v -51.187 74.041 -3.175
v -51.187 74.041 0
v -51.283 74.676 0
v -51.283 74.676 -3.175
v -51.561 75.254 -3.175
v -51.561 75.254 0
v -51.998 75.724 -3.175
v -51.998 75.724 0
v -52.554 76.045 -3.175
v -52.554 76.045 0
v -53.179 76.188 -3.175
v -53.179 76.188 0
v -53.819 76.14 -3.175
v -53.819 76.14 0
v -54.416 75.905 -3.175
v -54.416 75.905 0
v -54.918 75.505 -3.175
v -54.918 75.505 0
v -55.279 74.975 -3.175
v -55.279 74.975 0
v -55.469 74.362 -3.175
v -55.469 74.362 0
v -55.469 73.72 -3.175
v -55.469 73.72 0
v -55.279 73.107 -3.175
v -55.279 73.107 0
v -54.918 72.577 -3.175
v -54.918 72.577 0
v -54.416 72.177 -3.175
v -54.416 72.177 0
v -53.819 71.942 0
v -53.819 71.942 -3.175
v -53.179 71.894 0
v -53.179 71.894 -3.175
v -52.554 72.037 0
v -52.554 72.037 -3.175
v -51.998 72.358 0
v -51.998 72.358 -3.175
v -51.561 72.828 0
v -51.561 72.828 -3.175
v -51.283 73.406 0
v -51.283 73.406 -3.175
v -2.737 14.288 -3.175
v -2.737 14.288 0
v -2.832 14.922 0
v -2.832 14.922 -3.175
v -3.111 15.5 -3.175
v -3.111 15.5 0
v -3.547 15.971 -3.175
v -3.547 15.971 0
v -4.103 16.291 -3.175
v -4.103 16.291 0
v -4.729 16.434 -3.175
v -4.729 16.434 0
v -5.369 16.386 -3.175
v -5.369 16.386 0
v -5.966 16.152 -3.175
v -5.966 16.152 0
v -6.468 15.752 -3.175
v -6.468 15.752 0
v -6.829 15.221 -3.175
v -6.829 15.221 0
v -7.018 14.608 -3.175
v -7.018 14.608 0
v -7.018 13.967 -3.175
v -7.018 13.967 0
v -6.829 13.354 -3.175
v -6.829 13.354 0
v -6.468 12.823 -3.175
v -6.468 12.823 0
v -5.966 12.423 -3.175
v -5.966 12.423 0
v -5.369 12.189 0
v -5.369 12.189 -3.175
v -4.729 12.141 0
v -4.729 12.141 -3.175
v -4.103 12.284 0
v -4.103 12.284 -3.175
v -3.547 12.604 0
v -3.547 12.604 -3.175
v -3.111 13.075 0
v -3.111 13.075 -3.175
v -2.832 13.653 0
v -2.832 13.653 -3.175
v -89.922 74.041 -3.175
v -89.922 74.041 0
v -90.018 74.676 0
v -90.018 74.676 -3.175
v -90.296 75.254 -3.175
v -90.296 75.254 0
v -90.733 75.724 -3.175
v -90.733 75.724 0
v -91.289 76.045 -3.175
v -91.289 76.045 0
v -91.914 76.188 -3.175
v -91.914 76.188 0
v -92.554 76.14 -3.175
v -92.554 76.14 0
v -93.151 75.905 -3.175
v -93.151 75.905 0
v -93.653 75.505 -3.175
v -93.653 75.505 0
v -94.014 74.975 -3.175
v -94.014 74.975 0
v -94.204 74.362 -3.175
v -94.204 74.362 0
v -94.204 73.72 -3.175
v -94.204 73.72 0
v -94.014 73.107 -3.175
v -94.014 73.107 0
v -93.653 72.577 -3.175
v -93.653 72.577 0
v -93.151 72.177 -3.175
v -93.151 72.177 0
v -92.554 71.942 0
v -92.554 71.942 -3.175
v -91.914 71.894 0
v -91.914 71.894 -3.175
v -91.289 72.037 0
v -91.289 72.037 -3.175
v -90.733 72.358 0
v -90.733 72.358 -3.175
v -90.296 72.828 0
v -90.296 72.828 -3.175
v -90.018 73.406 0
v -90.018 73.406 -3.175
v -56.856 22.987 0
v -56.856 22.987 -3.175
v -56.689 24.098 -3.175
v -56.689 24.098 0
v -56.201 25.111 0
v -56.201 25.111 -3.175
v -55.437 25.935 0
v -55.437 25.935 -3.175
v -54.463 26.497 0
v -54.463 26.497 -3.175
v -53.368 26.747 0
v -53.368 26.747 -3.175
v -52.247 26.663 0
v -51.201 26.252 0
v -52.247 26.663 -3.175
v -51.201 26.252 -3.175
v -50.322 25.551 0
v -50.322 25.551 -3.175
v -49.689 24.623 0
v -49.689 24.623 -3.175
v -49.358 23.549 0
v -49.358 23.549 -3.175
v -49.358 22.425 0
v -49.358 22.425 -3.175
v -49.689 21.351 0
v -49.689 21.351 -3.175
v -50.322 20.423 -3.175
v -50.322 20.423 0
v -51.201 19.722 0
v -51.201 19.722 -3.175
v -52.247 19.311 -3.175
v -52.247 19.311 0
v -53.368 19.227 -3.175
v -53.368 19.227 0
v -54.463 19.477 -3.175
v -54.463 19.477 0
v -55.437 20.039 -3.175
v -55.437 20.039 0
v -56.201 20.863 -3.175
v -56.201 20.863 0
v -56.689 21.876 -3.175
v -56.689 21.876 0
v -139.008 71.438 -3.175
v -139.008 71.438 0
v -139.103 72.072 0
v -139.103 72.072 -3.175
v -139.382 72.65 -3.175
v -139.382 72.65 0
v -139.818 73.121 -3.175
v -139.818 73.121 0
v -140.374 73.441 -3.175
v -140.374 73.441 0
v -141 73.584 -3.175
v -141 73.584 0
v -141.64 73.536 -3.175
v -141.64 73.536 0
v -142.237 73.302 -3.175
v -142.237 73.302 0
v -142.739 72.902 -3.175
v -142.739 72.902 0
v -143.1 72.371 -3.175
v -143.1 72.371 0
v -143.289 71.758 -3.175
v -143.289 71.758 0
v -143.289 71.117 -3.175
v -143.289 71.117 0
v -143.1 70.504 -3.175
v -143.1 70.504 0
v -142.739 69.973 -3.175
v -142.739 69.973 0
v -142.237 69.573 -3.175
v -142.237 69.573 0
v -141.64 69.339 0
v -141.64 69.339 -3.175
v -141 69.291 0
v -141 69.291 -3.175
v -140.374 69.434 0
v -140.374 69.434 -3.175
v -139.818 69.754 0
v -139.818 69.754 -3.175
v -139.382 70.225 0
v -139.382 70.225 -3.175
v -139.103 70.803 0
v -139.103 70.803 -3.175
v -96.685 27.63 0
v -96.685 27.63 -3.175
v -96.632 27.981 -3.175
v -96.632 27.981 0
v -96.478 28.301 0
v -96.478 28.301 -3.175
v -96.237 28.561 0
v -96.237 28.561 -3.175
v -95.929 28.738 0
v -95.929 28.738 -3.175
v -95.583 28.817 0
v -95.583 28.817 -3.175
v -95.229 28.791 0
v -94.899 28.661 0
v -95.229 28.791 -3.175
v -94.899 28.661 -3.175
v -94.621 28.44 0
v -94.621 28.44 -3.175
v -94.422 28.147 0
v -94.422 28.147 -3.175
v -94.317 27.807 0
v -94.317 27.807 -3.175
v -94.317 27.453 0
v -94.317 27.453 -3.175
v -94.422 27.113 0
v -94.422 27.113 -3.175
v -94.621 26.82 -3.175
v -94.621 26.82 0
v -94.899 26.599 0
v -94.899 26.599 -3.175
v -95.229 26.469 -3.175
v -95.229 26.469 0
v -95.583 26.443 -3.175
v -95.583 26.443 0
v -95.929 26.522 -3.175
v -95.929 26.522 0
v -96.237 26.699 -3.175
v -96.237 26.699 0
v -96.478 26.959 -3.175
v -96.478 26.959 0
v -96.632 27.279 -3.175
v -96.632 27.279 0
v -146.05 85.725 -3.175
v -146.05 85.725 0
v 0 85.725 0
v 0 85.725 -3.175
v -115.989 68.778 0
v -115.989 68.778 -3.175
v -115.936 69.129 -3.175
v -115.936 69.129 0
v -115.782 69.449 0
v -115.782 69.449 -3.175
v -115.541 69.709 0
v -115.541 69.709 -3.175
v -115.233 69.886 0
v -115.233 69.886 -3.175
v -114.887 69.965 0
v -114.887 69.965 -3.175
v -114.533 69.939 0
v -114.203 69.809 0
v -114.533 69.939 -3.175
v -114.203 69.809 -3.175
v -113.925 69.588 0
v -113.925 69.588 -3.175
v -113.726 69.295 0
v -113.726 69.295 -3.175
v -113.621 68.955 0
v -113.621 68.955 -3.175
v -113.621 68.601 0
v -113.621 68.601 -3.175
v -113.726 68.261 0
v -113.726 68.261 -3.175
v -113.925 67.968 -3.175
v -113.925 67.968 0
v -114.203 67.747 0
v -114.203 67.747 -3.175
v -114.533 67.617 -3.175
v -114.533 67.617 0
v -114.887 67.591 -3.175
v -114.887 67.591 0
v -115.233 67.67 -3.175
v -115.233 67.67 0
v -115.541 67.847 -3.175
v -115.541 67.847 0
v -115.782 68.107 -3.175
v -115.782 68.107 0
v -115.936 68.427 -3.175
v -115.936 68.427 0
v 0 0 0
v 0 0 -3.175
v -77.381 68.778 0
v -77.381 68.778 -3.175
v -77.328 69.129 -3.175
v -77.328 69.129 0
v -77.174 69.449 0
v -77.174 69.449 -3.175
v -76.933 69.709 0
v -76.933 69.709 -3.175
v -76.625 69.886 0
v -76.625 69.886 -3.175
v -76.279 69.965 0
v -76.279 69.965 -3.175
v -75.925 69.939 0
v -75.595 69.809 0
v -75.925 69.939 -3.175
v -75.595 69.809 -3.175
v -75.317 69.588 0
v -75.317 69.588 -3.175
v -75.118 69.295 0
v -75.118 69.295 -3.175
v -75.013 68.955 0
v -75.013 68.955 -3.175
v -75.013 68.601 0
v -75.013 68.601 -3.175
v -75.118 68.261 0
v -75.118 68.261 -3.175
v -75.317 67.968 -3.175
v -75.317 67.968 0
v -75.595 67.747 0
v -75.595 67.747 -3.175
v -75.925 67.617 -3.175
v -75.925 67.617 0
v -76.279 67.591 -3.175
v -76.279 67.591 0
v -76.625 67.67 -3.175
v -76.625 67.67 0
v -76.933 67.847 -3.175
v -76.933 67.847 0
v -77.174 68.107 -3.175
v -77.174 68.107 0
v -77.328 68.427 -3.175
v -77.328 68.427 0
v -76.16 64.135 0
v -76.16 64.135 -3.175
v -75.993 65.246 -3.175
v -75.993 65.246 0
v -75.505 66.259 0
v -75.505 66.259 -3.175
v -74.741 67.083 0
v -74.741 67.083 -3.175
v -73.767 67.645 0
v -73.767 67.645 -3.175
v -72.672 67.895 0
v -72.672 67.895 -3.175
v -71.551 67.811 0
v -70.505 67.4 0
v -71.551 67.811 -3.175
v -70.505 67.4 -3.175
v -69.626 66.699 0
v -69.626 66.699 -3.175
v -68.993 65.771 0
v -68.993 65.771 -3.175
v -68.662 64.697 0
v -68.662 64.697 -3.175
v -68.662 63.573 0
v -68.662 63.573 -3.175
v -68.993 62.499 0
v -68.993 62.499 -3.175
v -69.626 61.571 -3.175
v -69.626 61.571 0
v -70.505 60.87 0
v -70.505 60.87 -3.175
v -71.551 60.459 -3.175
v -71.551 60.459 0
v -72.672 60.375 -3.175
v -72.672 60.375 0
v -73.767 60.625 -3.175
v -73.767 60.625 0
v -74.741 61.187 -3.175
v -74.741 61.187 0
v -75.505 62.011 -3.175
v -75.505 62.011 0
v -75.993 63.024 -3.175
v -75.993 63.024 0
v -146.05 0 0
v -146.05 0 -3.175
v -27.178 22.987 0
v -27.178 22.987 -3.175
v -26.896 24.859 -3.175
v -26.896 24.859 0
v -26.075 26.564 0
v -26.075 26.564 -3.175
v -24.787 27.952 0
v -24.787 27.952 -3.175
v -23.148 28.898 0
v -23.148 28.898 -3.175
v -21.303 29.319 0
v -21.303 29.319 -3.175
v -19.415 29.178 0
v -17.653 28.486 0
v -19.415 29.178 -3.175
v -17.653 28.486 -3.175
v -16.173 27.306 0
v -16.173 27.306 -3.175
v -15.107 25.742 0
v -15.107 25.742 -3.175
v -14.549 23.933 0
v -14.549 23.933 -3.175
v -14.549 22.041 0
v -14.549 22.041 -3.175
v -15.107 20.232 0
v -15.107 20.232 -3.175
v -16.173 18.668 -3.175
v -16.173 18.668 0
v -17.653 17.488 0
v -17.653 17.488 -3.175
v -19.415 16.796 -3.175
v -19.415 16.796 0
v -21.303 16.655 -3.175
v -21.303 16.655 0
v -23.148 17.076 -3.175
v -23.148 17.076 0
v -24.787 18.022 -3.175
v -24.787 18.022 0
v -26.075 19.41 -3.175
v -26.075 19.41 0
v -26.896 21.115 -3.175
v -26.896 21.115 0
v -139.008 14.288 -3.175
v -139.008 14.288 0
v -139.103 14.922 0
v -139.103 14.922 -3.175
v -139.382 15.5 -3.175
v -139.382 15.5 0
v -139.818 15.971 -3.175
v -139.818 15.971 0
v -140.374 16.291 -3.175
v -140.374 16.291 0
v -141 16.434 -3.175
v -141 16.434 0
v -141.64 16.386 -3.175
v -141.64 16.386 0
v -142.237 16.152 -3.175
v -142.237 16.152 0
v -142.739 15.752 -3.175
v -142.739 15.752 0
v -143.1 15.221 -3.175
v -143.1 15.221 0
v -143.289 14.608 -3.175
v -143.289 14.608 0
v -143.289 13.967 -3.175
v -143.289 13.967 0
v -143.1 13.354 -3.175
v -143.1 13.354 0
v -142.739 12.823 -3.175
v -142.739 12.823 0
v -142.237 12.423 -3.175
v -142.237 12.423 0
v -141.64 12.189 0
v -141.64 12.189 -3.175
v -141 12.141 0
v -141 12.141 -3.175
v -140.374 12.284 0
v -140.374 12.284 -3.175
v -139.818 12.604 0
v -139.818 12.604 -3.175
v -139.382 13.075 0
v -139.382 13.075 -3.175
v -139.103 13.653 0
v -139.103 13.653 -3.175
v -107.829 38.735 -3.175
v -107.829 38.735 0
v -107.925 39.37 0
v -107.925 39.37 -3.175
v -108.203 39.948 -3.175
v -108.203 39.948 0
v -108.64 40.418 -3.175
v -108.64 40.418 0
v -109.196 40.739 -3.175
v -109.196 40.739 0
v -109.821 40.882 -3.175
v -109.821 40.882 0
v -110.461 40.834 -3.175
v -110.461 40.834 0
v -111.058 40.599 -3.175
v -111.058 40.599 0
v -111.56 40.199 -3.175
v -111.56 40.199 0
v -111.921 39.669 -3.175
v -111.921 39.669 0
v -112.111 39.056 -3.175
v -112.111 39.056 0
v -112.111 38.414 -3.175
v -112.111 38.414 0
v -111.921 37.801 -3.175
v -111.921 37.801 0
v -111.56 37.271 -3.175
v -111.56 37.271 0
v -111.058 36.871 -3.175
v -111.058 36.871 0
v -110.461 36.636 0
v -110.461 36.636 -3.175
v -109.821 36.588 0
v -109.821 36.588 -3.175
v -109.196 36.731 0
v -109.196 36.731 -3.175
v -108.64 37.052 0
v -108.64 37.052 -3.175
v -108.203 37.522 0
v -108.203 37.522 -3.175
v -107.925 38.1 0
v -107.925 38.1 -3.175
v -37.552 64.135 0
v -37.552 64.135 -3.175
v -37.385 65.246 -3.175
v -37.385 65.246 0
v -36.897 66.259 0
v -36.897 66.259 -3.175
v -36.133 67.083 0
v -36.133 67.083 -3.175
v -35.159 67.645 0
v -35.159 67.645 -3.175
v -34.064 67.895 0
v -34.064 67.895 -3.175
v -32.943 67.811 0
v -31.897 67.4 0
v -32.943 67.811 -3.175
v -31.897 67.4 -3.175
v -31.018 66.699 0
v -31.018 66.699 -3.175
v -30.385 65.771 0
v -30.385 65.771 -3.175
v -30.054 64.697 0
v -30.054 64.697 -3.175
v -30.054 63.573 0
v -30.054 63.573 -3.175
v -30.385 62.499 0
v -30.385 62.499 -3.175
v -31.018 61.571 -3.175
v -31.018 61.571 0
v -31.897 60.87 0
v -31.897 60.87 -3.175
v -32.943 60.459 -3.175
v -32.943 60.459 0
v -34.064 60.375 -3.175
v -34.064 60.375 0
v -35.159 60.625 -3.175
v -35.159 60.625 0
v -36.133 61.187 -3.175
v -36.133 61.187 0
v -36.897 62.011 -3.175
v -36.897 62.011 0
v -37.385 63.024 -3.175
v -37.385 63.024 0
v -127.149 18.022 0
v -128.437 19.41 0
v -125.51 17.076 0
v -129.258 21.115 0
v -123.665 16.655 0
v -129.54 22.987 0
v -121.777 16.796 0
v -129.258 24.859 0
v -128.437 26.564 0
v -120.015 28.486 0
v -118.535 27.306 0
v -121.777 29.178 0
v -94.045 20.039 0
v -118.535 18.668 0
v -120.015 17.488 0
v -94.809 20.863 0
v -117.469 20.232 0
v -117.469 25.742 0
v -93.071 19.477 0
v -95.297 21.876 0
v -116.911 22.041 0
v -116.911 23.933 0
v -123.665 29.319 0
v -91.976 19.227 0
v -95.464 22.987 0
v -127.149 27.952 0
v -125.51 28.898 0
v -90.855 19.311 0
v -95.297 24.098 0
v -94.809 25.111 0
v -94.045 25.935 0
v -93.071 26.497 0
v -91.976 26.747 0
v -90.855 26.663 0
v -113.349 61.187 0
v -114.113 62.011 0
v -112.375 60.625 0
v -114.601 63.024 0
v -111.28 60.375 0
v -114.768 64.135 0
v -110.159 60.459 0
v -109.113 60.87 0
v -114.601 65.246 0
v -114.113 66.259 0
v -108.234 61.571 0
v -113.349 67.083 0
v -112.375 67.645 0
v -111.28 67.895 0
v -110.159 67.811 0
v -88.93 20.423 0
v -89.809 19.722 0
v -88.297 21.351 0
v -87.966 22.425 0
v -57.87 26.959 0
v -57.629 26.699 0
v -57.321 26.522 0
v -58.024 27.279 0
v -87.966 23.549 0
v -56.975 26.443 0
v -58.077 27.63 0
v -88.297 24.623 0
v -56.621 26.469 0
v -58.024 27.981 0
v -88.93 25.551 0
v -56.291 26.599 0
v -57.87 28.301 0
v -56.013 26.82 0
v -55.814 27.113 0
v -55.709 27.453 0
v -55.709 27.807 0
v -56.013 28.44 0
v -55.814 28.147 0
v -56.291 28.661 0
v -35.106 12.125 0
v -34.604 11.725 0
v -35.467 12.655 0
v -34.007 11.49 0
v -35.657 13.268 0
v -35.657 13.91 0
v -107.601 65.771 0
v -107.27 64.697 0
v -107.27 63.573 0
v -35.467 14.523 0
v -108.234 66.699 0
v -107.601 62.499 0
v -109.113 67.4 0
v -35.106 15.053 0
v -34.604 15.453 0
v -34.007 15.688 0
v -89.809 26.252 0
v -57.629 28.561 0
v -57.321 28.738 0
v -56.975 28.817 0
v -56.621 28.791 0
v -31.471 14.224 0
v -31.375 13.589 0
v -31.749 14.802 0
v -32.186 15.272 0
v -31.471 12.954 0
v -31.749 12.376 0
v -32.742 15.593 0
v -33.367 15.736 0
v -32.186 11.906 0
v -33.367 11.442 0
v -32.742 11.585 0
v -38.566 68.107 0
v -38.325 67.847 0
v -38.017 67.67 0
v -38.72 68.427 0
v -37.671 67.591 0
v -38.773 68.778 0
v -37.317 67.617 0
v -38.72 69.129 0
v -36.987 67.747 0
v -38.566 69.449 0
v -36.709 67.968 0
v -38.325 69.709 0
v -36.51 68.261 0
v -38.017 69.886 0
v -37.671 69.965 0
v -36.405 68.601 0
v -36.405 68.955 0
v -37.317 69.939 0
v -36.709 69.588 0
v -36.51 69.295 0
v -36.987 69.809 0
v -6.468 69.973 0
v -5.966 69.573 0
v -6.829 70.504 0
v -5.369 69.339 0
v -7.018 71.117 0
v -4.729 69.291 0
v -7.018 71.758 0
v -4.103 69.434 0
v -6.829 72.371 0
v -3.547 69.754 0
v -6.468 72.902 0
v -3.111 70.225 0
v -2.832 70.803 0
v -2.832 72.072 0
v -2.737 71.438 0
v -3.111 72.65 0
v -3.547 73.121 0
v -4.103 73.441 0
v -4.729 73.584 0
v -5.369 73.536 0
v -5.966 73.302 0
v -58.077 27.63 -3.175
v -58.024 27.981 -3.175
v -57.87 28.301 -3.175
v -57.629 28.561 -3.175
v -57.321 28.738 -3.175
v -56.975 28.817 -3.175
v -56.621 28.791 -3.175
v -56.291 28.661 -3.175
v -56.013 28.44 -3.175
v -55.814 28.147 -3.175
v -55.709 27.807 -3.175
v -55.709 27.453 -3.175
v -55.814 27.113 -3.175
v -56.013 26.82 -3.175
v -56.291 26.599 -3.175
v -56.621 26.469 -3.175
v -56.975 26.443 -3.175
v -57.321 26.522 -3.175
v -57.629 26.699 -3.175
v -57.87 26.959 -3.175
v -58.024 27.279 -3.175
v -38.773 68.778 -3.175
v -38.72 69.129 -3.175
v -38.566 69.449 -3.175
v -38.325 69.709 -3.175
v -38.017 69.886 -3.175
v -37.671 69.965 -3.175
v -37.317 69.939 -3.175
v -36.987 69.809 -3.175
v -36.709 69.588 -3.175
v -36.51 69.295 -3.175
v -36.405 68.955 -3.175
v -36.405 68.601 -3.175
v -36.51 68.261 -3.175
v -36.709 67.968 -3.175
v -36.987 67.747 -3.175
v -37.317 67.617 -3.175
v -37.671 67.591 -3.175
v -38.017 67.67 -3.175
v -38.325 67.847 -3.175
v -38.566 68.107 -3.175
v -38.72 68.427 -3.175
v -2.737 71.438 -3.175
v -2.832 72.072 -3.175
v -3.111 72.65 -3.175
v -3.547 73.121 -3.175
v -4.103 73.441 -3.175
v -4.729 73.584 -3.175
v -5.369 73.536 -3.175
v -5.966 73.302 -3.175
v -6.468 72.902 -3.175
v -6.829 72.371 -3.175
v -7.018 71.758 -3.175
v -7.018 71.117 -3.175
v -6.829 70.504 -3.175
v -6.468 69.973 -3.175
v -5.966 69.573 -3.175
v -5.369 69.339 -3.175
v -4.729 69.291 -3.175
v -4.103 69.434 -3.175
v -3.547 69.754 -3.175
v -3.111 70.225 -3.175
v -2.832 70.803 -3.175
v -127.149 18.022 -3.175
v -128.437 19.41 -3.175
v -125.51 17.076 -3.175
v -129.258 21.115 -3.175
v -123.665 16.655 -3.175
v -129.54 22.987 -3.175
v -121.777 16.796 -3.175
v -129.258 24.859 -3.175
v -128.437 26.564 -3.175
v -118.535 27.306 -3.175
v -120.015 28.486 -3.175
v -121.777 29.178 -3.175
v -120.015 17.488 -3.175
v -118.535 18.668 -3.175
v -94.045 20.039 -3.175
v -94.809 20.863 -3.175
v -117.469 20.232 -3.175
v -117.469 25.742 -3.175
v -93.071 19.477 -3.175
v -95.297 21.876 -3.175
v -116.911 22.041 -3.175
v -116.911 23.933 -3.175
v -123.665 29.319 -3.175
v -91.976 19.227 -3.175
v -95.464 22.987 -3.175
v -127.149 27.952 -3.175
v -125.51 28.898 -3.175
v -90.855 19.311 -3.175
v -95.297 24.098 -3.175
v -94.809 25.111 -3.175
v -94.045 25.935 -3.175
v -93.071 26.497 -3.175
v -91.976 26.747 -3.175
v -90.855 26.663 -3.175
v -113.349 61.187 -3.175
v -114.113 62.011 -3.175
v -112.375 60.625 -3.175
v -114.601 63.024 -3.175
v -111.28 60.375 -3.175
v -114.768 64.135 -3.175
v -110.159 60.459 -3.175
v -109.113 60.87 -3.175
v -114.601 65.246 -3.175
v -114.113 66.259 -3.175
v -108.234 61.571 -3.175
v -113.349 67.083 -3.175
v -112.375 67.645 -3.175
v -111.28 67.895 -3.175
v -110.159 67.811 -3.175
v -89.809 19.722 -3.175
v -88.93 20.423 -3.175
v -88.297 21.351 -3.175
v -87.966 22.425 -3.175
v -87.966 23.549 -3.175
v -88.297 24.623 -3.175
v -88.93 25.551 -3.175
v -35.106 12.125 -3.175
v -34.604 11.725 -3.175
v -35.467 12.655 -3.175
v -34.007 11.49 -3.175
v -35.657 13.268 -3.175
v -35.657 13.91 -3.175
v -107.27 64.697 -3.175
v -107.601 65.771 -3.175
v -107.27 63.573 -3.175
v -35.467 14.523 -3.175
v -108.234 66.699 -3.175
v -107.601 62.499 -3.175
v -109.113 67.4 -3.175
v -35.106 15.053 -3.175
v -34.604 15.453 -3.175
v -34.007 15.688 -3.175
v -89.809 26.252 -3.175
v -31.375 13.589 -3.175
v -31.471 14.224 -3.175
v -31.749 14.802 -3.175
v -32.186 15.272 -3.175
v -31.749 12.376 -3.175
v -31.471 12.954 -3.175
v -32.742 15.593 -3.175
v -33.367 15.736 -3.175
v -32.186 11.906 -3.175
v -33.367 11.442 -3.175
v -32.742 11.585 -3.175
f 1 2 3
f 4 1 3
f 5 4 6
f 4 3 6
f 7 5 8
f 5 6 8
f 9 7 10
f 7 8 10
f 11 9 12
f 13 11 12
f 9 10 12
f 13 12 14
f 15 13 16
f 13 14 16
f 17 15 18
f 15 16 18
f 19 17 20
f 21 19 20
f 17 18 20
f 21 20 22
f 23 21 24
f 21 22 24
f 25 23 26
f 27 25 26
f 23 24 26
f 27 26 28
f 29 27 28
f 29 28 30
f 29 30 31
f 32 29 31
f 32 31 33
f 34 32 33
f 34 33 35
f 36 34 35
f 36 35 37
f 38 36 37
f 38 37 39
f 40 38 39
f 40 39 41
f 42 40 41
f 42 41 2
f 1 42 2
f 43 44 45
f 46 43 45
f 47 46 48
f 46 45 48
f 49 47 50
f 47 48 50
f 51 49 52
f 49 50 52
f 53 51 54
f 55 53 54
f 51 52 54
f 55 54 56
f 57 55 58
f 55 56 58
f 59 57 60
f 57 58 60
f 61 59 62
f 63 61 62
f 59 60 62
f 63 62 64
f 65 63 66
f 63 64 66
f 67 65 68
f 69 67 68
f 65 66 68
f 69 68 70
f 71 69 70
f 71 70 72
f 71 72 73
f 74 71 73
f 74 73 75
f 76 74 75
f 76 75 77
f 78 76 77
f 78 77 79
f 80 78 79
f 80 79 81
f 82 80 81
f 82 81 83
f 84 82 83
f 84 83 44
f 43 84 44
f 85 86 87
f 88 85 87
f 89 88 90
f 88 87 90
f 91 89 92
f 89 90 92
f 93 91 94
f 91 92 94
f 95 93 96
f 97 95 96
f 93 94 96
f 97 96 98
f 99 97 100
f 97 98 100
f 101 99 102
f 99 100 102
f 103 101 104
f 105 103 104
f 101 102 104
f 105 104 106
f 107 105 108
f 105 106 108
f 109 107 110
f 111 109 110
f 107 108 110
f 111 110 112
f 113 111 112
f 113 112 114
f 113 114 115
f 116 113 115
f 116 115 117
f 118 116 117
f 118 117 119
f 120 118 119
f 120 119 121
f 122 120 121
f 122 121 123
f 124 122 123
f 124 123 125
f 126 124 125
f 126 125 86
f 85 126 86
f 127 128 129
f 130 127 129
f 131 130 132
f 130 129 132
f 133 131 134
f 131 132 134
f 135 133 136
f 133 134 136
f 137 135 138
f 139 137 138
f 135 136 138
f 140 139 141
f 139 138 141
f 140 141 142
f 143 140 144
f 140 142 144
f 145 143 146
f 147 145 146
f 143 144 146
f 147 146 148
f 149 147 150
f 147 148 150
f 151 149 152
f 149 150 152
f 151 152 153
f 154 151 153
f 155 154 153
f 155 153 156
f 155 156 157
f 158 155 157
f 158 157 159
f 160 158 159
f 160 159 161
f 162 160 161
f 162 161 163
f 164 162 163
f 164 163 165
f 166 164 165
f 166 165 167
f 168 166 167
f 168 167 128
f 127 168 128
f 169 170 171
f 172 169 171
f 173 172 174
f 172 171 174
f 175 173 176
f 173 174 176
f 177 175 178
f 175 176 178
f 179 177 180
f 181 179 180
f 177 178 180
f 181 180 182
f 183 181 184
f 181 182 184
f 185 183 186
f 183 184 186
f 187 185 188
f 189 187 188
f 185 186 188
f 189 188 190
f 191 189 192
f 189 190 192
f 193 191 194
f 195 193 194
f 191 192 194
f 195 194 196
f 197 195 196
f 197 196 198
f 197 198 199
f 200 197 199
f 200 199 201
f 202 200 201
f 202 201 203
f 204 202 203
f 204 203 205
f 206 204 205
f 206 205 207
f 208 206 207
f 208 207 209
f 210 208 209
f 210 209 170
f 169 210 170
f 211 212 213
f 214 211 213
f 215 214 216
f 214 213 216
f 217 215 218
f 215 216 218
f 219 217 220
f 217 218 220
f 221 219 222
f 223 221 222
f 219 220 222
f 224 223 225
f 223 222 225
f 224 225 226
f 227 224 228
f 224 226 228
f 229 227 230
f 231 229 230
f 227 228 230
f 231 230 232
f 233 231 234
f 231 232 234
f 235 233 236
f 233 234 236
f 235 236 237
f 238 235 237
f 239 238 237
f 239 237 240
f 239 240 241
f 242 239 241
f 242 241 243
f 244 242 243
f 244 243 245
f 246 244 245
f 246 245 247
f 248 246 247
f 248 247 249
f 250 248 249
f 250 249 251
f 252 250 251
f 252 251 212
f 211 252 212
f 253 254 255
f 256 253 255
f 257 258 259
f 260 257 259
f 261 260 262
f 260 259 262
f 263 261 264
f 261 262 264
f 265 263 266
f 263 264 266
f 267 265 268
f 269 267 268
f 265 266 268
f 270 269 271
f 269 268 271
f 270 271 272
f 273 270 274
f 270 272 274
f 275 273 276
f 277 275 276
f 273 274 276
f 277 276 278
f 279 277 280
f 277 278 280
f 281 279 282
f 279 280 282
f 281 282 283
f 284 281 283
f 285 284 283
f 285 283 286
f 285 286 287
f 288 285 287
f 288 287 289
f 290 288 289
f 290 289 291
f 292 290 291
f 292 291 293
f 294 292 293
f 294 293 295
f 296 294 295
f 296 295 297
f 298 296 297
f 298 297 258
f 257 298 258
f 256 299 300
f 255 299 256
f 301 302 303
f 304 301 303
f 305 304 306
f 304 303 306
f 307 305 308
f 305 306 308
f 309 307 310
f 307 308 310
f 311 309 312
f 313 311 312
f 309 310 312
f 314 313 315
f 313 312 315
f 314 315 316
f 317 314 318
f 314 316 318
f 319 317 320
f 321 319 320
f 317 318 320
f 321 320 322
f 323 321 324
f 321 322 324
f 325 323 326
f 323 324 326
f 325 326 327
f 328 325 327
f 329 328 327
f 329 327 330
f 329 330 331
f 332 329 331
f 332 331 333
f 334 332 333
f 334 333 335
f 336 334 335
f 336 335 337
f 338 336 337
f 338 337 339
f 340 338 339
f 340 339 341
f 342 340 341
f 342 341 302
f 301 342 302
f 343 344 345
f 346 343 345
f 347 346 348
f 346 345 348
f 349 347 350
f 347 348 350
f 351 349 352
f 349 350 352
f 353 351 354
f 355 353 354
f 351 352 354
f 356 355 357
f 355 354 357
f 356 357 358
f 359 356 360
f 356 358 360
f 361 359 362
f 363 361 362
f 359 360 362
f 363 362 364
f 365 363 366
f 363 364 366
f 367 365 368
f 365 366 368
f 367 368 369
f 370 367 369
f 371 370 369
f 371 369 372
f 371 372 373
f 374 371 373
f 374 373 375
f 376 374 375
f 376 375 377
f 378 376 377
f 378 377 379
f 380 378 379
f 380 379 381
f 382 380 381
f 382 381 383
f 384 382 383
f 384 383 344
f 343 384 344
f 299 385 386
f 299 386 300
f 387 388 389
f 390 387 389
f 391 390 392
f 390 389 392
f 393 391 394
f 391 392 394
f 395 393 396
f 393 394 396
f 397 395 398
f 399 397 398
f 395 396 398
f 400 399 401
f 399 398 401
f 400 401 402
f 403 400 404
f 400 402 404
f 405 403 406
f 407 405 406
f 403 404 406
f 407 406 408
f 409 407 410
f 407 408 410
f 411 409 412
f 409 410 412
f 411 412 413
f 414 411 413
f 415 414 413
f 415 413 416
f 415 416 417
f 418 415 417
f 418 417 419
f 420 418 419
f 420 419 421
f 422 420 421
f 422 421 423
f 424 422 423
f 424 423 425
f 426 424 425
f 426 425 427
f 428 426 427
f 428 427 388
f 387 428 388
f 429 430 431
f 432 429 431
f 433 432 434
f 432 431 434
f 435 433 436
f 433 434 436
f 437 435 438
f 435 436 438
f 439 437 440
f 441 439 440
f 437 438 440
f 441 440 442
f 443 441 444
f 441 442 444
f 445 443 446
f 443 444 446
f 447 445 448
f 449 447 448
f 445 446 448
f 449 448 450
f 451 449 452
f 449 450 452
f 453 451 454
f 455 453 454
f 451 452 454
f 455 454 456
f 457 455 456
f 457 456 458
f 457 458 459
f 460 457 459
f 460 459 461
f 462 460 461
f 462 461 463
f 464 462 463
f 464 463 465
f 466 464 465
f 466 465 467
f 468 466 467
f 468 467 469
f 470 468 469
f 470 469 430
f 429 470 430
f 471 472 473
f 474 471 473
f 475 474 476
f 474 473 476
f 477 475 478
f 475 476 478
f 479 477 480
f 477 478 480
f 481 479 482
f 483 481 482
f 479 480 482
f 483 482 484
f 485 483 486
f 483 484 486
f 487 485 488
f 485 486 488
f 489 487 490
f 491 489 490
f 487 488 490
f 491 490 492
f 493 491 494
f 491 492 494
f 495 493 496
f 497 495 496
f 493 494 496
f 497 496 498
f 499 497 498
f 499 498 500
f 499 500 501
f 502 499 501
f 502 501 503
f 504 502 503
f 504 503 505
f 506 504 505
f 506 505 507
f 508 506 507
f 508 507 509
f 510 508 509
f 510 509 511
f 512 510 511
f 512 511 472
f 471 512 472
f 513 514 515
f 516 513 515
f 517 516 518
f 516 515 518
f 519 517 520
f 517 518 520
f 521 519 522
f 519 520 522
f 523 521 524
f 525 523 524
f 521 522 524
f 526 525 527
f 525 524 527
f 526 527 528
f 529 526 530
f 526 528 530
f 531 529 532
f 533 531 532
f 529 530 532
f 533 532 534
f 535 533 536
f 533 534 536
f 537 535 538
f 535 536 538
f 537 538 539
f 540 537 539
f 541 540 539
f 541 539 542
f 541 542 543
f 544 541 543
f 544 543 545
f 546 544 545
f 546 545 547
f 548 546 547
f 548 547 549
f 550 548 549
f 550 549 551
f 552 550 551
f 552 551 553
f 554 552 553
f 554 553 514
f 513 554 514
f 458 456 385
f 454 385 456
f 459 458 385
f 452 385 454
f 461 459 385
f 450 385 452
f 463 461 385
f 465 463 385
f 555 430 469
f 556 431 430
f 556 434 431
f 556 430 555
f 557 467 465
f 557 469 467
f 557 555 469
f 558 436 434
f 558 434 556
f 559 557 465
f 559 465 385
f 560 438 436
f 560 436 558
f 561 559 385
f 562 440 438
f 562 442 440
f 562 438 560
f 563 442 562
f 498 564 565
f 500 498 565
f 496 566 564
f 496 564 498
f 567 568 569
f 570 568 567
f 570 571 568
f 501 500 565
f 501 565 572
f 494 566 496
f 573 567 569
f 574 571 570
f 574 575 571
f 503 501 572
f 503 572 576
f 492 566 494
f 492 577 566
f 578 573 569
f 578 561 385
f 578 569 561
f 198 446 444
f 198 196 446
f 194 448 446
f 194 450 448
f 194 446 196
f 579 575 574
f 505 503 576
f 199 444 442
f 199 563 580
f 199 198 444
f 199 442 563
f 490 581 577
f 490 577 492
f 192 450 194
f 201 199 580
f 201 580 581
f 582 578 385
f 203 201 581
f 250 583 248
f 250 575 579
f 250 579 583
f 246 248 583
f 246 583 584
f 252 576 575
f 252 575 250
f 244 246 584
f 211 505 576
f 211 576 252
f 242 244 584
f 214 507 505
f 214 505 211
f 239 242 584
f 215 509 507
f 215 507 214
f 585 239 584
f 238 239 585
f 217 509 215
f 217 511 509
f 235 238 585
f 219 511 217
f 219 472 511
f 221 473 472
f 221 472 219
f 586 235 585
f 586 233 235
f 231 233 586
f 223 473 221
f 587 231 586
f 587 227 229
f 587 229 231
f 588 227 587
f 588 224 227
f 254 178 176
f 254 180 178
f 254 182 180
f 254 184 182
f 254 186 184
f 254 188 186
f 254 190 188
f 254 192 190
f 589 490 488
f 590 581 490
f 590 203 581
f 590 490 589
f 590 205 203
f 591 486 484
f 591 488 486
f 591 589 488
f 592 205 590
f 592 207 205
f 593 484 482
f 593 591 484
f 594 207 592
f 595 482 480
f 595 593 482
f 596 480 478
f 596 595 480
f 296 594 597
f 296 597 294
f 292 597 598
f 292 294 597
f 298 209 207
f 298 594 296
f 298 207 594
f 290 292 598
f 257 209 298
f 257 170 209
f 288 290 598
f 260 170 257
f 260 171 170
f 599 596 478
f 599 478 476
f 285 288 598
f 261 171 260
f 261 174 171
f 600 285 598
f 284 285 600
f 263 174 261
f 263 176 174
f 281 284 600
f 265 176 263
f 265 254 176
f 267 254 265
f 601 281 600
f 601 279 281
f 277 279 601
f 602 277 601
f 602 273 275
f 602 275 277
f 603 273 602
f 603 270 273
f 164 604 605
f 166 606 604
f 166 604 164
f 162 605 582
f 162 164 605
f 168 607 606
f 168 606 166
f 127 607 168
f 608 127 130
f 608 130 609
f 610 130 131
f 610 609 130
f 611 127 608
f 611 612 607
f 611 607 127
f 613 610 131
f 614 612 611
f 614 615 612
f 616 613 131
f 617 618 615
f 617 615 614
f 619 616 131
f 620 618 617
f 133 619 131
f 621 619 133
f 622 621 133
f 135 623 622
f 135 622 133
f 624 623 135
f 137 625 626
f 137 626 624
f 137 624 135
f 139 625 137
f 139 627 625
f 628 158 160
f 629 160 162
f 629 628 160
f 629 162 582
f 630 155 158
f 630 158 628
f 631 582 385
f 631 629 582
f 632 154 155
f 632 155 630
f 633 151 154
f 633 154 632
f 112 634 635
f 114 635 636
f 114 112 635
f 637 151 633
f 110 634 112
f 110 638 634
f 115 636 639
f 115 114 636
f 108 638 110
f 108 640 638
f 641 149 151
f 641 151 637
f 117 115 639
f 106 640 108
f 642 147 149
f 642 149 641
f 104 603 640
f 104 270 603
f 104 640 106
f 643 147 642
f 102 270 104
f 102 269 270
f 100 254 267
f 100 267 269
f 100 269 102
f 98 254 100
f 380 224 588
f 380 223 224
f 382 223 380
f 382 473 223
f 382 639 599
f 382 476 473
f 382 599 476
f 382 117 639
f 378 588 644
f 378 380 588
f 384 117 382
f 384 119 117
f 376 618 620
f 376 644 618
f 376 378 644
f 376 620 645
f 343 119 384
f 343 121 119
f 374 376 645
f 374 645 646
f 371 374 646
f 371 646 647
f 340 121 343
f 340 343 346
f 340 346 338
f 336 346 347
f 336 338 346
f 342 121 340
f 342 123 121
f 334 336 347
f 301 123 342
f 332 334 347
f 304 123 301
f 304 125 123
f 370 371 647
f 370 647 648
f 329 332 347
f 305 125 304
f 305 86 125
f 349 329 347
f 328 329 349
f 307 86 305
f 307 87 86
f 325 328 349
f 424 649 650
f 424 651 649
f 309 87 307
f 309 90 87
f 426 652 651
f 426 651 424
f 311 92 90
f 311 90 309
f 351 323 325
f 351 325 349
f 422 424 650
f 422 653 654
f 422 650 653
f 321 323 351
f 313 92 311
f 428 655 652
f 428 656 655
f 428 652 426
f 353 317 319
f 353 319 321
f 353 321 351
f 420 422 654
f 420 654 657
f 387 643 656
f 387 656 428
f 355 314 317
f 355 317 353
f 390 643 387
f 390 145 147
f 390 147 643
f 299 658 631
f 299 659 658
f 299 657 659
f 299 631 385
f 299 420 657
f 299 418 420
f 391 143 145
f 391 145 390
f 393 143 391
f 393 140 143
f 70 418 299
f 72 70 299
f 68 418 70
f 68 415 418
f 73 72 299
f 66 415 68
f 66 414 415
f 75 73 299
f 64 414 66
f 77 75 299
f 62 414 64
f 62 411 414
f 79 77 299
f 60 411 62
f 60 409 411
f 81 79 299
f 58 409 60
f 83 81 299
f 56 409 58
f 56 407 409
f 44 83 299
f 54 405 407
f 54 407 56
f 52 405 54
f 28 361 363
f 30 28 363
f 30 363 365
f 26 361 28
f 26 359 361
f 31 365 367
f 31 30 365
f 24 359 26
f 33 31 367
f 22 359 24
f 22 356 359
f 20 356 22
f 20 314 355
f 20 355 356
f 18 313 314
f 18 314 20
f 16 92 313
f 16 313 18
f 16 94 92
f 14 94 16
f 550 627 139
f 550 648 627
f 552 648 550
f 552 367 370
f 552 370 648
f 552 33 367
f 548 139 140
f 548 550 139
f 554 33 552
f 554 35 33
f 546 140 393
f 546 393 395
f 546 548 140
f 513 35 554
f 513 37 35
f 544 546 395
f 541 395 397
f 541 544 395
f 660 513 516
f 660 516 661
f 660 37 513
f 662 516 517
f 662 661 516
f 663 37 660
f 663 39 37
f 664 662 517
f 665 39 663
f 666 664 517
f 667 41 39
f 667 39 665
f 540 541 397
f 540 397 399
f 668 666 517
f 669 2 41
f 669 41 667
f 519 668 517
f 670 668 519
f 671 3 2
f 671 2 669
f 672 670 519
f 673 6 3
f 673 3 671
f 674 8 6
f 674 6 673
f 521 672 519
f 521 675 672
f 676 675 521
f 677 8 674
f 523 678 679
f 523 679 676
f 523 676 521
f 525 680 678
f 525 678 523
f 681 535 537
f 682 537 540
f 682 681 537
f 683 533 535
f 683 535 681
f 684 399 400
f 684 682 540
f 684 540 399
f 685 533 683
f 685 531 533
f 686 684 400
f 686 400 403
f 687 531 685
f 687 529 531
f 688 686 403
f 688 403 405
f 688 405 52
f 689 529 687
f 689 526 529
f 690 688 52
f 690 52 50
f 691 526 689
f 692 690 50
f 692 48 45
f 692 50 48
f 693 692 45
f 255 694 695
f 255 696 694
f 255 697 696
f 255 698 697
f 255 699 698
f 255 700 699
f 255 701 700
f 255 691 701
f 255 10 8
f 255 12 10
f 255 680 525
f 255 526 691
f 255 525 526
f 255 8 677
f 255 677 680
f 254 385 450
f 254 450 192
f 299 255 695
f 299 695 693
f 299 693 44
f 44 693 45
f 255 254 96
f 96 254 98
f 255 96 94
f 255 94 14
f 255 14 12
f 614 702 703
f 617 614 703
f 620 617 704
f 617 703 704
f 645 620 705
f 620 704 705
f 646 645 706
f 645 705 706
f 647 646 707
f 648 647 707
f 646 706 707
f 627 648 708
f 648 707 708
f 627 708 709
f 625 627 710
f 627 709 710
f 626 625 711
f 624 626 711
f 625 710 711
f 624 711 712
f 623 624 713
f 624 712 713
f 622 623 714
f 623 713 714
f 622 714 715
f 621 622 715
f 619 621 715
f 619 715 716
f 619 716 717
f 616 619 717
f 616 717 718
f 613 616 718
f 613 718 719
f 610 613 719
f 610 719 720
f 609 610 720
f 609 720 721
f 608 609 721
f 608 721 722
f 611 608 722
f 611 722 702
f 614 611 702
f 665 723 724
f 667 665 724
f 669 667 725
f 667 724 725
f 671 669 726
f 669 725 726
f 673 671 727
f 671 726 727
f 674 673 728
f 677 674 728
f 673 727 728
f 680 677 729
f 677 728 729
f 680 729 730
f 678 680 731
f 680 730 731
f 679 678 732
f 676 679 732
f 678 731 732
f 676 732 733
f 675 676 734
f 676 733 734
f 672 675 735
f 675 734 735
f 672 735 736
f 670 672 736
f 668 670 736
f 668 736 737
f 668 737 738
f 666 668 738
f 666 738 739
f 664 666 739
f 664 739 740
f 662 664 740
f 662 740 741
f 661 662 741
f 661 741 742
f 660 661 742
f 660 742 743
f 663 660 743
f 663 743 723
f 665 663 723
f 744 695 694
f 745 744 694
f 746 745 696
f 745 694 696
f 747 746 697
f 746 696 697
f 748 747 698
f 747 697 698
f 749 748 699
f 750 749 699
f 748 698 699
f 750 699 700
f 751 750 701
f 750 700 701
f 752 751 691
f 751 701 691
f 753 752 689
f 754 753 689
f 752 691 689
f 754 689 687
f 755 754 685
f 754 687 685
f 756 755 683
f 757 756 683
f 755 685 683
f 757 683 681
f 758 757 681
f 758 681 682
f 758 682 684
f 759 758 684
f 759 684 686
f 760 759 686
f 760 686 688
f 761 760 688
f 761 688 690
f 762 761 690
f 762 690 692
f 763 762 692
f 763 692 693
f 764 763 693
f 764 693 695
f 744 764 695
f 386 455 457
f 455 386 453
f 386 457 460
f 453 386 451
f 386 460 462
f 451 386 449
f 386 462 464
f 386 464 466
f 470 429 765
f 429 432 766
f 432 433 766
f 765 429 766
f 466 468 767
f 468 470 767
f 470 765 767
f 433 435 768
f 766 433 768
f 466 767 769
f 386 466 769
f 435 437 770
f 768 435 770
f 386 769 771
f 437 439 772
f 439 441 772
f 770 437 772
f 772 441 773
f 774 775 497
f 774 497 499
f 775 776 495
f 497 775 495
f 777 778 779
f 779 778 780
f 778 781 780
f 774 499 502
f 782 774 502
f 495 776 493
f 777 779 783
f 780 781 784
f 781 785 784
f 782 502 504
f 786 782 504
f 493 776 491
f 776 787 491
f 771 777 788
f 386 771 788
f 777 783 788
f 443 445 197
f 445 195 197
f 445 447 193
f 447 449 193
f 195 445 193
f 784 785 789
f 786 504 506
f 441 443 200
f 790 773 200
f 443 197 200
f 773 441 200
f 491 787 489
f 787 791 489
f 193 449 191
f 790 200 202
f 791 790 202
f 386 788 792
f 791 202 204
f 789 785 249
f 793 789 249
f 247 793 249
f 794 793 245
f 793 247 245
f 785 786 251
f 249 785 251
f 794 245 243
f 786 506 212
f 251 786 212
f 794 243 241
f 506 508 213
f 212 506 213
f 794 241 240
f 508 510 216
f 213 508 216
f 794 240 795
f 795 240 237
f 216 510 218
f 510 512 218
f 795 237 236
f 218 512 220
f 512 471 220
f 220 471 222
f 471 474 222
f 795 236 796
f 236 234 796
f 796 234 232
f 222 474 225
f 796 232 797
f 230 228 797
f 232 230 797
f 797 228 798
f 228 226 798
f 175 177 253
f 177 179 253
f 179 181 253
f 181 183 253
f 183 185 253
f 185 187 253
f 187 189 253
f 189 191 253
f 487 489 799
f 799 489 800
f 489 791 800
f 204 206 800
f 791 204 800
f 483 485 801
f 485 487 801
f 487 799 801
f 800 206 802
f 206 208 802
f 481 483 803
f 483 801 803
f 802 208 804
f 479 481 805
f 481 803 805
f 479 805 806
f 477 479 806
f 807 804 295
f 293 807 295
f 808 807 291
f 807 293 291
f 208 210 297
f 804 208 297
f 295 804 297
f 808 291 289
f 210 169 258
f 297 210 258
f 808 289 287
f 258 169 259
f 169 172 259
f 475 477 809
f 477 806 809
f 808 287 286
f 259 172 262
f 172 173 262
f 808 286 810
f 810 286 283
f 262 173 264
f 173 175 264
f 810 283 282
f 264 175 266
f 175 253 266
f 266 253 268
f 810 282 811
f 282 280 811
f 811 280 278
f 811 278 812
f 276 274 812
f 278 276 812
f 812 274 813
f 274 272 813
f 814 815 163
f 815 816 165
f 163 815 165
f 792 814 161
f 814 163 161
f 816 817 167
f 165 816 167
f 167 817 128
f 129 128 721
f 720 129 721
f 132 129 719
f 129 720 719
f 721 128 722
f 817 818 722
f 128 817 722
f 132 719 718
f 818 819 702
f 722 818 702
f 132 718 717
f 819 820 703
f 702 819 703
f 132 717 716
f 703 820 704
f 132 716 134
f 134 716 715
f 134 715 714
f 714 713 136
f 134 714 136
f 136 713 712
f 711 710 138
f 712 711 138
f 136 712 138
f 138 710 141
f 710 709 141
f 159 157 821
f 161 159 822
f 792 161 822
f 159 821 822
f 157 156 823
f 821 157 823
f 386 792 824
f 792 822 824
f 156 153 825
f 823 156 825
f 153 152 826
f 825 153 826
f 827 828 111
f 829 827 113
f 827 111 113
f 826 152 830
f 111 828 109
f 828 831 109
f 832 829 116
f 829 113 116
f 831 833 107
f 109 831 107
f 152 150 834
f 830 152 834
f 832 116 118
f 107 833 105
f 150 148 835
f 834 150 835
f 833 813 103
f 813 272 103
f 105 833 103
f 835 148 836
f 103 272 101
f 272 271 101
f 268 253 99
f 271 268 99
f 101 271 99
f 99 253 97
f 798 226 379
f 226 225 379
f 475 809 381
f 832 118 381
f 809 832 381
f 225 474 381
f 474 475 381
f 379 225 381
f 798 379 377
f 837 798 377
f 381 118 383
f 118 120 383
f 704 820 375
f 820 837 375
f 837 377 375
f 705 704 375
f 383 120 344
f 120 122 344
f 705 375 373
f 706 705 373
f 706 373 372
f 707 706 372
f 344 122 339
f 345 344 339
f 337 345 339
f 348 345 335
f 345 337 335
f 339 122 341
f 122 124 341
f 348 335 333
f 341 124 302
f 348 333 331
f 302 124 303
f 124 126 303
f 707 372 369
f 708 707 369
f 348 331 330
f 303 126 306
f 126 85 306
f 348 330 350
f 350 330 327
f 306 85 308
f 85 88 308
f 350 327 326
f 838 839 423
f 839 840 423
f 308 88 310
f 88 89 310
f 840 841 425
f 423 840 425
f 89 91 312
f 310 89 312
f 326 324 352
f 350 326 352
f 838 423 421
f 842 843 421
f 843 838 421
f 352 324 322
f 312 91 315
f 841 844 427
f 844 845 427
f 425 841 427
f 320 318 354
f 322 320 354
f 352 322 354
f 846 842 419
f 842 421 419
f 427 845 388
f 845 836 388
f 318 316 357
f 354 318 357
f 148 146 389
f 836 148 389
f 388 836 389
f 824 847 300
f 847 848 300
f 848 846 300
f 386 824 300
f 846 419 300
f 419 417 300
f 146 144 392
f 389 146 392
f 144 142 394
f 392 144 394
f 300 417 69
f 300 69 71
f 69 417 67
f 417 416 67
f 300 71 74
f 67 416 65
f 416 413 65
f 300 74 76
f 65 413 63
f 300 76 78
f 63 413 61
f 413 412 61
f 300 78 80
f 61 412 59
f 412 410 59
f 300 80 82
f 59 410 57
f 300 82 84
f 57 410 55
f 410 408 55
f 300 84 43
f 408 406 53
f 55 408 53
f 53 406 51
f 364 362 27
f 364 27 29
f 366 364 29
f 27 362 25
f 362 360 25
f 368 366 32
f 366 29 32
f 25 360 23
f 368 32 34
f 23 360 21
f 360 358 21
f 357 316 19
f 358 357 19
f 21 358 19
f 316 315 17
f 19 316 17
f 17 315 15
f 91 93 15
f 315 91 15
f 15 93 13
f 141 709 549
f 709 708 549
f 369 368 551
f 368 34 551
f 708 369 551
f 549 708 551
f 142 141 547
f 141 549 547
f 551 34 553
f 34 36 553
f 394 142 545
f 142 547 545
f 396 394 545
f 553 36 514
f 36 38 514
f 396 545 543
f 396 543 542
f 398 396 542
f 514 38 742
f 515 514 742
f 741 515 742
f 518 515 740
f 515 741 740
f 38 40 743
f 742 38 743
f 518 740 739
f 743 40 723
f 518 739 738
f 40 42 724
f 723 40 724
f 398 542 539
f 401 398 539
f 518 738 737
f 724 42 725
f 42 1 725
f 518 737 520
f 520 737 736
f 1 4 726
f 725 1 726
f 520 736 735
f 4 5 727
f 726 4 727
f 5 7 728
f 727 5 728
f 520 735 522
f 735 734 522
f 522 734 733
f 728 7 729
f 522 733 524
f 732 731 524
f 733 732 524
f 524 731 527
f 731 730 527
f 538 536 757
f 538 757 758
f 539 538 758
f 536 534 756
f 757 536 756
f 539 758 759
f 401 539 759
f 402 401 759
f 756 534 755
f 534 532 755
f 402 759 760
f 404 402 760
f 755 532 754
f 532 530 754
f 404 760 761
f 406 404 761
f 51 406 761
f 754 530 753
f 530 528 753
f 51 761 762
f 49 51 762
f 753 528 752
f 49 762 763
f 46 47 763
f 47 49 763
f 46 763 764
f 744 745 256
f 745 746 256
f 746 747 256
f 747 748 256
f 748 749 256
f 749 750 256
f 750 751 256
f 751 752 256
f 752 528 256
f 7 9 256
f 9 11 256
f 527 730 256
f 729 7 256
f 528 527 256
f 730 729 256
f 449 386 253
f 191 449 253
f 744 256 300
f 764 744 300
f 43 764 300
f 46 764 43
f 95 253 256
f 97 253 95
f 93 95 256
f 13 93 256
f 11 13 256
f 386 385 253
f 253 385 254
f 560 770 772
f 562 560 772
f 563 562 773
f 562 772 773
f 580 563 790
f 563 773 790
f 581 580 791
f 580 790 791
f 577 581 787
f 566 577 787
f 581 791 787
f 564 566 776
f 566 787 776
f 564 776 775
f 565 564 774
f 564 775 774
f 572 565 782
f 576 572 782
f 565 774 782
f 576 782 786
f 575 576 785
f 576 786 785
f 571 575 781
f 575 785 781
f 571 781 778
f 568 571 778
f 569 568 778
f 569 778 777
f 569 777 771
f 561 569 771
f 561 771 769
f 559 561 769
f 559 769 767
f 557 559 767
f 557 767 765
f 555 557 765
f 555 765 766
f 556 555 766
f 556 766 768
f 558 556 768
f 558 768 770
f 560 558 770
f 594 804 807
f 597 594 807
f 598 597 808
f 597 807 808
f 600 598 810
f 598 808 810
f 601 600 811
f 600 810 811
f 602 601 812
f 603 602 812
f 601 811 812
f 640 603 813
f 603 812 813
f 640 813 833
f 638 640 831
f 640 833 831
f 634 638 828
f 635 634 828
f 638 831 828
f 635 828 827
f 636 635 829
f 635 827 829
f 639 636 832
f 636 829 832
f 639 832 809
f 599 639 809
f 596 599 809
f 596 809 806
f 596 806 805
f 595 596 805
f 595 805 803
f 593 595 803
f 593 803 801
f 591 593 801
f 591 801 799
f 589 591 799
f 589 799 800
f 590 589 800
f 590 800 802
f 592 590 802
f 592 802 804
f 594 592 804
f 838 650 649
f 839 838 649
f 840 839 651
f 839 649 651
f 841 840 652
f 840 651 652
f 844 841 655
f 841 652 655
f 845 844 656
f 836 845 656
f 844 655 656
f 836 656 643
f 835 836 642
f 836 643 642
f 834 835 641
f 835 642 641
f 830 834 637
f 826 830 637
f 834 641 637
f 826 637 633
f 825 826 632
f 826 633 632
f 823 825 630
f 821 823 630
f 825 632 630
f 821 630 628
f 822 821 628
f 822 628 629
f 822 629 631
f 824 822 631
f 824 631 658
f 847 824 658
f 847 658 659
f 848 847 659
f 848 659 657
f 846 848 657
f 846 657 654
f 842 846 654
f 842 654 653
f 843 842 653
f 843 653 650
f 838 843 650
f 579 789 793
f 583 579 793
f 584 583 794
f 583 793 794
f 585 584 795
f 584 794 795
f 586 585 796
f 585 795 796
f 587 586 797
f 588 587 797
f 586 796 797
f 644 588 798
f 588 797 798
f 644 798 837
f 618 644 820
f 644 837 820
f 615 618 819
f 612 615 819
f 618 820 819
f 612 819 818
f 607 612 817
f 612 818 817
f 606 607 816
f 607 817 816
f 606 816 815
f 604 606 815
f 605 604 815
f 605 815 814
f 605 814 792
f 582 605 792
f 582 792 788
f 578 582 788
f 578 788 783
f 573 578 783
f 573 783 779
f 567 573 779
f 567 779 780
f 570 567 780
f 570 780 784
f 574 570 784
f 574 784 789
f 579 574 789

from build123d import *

# Parameters (mm, degrees)
SKETCH1_W                 = 146.05
SKETCH1_H                 = 85.725
BOSS_EXTRUDE1_DEPTH       = 3.175
F_6_CLEARANCE_HOLE1_D     = 4.3053
F_6_CLEARANCE_HOLE1_DEPTH = 12.7
F_6_CLEARANCE_HOLE1_TIP   = 1.293442612
SKETCH4_R                 = 6.35
SKETCH4_R_2               = 3.7703125
SKETCH4_R_3               = 1.190625
CUT_EXTRUDE1_DEPTH        = 4.175


with BuildPart() as part:
    # Sketch1 → Boss-Extrude1 (new body)
    with BuildSketch(Plane.XY):
        with Locations((-73.025, 42.8625)):
            Rectangle(SKETCH1_W, SKETCH1_H)
    extrude(amount=-BOSS_EXTRUDE1_DEPTH)

    # #6 Clearance Hole1
    with Locations(Plane(origin=(0, 0, -3.175), x_dir=(-1, 0, 0), z_dir=(0, 0, -1))):
        with Locations((4.8895, 71.4375), (53.34, 74.041), (92.075, 74.041), (141.1605, 71.4375), (109.982, 38.735), (141.1605, 14.2875), (33.528, 13.589), (4.8895, 14.2875)):
            Hole(F_6_CLEARANCE_HOLE1_D / 2, depth=F_6_CLEARANCE_HOLE1_DEPTH)
            with Locations((0, 0, -(F_6_CLEARANCE_HOLE1_DEPTH + F_6_CLEARANCE_HOLE1_TIP / 2))):  # 118° drill point
                Cone(0, F_6_CLEARANCE_HOLE1_D / 2, F_6_CLEARANCE_HOLE1_TIP, mode=Mode.SUBTRACT)

    # Sketch4 → Cut-Extrude1 (cut, through all)
    with BuildSketch(Plane(origin=(0, 0, -3.175), x_dir=(-1, 0, 0), z_dir=(0, 0, -1))):
        with Locations((20.828, 22.987)):
            Circle(SKETCH4_R)
        with Locations((123.19, 22.987)):
            Circle(SKETCH4_R)
        with Locations((33.782, 64.135)):
            Circle(SKETCH4_R_2)
        with Locations((72.39, 64.135)):
            Circle(SKETCH4_R_2)
        with Locations((110.998, 64.135)):
            Circle(SKETCH4_R_2)
        with Locations((91.694, 22.987)):
            Circle(SKETCH4_R_2)
        with Locations((53.086, 22.987)):
            Circle(SKETCH4_R_2)
        with Locations((37.582285256, 68.778041242)):
            Circle(SKETCH4_R_3)
        with Locations((76.190285256, 68.778041242)):
            Circle(SKETCH4_R_3)
        with Locations((114.798285256, 68.778041242)):
            Circle(SKETCH4_R_3)
        with Locations((56.886285256, 27.630041242)):
            Circle(SKETCH4_R_3)
        with Locations((95.494285256, 27.630041242)):
            Circle(SKETCH4_R_3)
    extrude(amount=-CUT_EXTRUDE1_DEPTH, mode=Mode.SUBTRACT)


solid = part.part
